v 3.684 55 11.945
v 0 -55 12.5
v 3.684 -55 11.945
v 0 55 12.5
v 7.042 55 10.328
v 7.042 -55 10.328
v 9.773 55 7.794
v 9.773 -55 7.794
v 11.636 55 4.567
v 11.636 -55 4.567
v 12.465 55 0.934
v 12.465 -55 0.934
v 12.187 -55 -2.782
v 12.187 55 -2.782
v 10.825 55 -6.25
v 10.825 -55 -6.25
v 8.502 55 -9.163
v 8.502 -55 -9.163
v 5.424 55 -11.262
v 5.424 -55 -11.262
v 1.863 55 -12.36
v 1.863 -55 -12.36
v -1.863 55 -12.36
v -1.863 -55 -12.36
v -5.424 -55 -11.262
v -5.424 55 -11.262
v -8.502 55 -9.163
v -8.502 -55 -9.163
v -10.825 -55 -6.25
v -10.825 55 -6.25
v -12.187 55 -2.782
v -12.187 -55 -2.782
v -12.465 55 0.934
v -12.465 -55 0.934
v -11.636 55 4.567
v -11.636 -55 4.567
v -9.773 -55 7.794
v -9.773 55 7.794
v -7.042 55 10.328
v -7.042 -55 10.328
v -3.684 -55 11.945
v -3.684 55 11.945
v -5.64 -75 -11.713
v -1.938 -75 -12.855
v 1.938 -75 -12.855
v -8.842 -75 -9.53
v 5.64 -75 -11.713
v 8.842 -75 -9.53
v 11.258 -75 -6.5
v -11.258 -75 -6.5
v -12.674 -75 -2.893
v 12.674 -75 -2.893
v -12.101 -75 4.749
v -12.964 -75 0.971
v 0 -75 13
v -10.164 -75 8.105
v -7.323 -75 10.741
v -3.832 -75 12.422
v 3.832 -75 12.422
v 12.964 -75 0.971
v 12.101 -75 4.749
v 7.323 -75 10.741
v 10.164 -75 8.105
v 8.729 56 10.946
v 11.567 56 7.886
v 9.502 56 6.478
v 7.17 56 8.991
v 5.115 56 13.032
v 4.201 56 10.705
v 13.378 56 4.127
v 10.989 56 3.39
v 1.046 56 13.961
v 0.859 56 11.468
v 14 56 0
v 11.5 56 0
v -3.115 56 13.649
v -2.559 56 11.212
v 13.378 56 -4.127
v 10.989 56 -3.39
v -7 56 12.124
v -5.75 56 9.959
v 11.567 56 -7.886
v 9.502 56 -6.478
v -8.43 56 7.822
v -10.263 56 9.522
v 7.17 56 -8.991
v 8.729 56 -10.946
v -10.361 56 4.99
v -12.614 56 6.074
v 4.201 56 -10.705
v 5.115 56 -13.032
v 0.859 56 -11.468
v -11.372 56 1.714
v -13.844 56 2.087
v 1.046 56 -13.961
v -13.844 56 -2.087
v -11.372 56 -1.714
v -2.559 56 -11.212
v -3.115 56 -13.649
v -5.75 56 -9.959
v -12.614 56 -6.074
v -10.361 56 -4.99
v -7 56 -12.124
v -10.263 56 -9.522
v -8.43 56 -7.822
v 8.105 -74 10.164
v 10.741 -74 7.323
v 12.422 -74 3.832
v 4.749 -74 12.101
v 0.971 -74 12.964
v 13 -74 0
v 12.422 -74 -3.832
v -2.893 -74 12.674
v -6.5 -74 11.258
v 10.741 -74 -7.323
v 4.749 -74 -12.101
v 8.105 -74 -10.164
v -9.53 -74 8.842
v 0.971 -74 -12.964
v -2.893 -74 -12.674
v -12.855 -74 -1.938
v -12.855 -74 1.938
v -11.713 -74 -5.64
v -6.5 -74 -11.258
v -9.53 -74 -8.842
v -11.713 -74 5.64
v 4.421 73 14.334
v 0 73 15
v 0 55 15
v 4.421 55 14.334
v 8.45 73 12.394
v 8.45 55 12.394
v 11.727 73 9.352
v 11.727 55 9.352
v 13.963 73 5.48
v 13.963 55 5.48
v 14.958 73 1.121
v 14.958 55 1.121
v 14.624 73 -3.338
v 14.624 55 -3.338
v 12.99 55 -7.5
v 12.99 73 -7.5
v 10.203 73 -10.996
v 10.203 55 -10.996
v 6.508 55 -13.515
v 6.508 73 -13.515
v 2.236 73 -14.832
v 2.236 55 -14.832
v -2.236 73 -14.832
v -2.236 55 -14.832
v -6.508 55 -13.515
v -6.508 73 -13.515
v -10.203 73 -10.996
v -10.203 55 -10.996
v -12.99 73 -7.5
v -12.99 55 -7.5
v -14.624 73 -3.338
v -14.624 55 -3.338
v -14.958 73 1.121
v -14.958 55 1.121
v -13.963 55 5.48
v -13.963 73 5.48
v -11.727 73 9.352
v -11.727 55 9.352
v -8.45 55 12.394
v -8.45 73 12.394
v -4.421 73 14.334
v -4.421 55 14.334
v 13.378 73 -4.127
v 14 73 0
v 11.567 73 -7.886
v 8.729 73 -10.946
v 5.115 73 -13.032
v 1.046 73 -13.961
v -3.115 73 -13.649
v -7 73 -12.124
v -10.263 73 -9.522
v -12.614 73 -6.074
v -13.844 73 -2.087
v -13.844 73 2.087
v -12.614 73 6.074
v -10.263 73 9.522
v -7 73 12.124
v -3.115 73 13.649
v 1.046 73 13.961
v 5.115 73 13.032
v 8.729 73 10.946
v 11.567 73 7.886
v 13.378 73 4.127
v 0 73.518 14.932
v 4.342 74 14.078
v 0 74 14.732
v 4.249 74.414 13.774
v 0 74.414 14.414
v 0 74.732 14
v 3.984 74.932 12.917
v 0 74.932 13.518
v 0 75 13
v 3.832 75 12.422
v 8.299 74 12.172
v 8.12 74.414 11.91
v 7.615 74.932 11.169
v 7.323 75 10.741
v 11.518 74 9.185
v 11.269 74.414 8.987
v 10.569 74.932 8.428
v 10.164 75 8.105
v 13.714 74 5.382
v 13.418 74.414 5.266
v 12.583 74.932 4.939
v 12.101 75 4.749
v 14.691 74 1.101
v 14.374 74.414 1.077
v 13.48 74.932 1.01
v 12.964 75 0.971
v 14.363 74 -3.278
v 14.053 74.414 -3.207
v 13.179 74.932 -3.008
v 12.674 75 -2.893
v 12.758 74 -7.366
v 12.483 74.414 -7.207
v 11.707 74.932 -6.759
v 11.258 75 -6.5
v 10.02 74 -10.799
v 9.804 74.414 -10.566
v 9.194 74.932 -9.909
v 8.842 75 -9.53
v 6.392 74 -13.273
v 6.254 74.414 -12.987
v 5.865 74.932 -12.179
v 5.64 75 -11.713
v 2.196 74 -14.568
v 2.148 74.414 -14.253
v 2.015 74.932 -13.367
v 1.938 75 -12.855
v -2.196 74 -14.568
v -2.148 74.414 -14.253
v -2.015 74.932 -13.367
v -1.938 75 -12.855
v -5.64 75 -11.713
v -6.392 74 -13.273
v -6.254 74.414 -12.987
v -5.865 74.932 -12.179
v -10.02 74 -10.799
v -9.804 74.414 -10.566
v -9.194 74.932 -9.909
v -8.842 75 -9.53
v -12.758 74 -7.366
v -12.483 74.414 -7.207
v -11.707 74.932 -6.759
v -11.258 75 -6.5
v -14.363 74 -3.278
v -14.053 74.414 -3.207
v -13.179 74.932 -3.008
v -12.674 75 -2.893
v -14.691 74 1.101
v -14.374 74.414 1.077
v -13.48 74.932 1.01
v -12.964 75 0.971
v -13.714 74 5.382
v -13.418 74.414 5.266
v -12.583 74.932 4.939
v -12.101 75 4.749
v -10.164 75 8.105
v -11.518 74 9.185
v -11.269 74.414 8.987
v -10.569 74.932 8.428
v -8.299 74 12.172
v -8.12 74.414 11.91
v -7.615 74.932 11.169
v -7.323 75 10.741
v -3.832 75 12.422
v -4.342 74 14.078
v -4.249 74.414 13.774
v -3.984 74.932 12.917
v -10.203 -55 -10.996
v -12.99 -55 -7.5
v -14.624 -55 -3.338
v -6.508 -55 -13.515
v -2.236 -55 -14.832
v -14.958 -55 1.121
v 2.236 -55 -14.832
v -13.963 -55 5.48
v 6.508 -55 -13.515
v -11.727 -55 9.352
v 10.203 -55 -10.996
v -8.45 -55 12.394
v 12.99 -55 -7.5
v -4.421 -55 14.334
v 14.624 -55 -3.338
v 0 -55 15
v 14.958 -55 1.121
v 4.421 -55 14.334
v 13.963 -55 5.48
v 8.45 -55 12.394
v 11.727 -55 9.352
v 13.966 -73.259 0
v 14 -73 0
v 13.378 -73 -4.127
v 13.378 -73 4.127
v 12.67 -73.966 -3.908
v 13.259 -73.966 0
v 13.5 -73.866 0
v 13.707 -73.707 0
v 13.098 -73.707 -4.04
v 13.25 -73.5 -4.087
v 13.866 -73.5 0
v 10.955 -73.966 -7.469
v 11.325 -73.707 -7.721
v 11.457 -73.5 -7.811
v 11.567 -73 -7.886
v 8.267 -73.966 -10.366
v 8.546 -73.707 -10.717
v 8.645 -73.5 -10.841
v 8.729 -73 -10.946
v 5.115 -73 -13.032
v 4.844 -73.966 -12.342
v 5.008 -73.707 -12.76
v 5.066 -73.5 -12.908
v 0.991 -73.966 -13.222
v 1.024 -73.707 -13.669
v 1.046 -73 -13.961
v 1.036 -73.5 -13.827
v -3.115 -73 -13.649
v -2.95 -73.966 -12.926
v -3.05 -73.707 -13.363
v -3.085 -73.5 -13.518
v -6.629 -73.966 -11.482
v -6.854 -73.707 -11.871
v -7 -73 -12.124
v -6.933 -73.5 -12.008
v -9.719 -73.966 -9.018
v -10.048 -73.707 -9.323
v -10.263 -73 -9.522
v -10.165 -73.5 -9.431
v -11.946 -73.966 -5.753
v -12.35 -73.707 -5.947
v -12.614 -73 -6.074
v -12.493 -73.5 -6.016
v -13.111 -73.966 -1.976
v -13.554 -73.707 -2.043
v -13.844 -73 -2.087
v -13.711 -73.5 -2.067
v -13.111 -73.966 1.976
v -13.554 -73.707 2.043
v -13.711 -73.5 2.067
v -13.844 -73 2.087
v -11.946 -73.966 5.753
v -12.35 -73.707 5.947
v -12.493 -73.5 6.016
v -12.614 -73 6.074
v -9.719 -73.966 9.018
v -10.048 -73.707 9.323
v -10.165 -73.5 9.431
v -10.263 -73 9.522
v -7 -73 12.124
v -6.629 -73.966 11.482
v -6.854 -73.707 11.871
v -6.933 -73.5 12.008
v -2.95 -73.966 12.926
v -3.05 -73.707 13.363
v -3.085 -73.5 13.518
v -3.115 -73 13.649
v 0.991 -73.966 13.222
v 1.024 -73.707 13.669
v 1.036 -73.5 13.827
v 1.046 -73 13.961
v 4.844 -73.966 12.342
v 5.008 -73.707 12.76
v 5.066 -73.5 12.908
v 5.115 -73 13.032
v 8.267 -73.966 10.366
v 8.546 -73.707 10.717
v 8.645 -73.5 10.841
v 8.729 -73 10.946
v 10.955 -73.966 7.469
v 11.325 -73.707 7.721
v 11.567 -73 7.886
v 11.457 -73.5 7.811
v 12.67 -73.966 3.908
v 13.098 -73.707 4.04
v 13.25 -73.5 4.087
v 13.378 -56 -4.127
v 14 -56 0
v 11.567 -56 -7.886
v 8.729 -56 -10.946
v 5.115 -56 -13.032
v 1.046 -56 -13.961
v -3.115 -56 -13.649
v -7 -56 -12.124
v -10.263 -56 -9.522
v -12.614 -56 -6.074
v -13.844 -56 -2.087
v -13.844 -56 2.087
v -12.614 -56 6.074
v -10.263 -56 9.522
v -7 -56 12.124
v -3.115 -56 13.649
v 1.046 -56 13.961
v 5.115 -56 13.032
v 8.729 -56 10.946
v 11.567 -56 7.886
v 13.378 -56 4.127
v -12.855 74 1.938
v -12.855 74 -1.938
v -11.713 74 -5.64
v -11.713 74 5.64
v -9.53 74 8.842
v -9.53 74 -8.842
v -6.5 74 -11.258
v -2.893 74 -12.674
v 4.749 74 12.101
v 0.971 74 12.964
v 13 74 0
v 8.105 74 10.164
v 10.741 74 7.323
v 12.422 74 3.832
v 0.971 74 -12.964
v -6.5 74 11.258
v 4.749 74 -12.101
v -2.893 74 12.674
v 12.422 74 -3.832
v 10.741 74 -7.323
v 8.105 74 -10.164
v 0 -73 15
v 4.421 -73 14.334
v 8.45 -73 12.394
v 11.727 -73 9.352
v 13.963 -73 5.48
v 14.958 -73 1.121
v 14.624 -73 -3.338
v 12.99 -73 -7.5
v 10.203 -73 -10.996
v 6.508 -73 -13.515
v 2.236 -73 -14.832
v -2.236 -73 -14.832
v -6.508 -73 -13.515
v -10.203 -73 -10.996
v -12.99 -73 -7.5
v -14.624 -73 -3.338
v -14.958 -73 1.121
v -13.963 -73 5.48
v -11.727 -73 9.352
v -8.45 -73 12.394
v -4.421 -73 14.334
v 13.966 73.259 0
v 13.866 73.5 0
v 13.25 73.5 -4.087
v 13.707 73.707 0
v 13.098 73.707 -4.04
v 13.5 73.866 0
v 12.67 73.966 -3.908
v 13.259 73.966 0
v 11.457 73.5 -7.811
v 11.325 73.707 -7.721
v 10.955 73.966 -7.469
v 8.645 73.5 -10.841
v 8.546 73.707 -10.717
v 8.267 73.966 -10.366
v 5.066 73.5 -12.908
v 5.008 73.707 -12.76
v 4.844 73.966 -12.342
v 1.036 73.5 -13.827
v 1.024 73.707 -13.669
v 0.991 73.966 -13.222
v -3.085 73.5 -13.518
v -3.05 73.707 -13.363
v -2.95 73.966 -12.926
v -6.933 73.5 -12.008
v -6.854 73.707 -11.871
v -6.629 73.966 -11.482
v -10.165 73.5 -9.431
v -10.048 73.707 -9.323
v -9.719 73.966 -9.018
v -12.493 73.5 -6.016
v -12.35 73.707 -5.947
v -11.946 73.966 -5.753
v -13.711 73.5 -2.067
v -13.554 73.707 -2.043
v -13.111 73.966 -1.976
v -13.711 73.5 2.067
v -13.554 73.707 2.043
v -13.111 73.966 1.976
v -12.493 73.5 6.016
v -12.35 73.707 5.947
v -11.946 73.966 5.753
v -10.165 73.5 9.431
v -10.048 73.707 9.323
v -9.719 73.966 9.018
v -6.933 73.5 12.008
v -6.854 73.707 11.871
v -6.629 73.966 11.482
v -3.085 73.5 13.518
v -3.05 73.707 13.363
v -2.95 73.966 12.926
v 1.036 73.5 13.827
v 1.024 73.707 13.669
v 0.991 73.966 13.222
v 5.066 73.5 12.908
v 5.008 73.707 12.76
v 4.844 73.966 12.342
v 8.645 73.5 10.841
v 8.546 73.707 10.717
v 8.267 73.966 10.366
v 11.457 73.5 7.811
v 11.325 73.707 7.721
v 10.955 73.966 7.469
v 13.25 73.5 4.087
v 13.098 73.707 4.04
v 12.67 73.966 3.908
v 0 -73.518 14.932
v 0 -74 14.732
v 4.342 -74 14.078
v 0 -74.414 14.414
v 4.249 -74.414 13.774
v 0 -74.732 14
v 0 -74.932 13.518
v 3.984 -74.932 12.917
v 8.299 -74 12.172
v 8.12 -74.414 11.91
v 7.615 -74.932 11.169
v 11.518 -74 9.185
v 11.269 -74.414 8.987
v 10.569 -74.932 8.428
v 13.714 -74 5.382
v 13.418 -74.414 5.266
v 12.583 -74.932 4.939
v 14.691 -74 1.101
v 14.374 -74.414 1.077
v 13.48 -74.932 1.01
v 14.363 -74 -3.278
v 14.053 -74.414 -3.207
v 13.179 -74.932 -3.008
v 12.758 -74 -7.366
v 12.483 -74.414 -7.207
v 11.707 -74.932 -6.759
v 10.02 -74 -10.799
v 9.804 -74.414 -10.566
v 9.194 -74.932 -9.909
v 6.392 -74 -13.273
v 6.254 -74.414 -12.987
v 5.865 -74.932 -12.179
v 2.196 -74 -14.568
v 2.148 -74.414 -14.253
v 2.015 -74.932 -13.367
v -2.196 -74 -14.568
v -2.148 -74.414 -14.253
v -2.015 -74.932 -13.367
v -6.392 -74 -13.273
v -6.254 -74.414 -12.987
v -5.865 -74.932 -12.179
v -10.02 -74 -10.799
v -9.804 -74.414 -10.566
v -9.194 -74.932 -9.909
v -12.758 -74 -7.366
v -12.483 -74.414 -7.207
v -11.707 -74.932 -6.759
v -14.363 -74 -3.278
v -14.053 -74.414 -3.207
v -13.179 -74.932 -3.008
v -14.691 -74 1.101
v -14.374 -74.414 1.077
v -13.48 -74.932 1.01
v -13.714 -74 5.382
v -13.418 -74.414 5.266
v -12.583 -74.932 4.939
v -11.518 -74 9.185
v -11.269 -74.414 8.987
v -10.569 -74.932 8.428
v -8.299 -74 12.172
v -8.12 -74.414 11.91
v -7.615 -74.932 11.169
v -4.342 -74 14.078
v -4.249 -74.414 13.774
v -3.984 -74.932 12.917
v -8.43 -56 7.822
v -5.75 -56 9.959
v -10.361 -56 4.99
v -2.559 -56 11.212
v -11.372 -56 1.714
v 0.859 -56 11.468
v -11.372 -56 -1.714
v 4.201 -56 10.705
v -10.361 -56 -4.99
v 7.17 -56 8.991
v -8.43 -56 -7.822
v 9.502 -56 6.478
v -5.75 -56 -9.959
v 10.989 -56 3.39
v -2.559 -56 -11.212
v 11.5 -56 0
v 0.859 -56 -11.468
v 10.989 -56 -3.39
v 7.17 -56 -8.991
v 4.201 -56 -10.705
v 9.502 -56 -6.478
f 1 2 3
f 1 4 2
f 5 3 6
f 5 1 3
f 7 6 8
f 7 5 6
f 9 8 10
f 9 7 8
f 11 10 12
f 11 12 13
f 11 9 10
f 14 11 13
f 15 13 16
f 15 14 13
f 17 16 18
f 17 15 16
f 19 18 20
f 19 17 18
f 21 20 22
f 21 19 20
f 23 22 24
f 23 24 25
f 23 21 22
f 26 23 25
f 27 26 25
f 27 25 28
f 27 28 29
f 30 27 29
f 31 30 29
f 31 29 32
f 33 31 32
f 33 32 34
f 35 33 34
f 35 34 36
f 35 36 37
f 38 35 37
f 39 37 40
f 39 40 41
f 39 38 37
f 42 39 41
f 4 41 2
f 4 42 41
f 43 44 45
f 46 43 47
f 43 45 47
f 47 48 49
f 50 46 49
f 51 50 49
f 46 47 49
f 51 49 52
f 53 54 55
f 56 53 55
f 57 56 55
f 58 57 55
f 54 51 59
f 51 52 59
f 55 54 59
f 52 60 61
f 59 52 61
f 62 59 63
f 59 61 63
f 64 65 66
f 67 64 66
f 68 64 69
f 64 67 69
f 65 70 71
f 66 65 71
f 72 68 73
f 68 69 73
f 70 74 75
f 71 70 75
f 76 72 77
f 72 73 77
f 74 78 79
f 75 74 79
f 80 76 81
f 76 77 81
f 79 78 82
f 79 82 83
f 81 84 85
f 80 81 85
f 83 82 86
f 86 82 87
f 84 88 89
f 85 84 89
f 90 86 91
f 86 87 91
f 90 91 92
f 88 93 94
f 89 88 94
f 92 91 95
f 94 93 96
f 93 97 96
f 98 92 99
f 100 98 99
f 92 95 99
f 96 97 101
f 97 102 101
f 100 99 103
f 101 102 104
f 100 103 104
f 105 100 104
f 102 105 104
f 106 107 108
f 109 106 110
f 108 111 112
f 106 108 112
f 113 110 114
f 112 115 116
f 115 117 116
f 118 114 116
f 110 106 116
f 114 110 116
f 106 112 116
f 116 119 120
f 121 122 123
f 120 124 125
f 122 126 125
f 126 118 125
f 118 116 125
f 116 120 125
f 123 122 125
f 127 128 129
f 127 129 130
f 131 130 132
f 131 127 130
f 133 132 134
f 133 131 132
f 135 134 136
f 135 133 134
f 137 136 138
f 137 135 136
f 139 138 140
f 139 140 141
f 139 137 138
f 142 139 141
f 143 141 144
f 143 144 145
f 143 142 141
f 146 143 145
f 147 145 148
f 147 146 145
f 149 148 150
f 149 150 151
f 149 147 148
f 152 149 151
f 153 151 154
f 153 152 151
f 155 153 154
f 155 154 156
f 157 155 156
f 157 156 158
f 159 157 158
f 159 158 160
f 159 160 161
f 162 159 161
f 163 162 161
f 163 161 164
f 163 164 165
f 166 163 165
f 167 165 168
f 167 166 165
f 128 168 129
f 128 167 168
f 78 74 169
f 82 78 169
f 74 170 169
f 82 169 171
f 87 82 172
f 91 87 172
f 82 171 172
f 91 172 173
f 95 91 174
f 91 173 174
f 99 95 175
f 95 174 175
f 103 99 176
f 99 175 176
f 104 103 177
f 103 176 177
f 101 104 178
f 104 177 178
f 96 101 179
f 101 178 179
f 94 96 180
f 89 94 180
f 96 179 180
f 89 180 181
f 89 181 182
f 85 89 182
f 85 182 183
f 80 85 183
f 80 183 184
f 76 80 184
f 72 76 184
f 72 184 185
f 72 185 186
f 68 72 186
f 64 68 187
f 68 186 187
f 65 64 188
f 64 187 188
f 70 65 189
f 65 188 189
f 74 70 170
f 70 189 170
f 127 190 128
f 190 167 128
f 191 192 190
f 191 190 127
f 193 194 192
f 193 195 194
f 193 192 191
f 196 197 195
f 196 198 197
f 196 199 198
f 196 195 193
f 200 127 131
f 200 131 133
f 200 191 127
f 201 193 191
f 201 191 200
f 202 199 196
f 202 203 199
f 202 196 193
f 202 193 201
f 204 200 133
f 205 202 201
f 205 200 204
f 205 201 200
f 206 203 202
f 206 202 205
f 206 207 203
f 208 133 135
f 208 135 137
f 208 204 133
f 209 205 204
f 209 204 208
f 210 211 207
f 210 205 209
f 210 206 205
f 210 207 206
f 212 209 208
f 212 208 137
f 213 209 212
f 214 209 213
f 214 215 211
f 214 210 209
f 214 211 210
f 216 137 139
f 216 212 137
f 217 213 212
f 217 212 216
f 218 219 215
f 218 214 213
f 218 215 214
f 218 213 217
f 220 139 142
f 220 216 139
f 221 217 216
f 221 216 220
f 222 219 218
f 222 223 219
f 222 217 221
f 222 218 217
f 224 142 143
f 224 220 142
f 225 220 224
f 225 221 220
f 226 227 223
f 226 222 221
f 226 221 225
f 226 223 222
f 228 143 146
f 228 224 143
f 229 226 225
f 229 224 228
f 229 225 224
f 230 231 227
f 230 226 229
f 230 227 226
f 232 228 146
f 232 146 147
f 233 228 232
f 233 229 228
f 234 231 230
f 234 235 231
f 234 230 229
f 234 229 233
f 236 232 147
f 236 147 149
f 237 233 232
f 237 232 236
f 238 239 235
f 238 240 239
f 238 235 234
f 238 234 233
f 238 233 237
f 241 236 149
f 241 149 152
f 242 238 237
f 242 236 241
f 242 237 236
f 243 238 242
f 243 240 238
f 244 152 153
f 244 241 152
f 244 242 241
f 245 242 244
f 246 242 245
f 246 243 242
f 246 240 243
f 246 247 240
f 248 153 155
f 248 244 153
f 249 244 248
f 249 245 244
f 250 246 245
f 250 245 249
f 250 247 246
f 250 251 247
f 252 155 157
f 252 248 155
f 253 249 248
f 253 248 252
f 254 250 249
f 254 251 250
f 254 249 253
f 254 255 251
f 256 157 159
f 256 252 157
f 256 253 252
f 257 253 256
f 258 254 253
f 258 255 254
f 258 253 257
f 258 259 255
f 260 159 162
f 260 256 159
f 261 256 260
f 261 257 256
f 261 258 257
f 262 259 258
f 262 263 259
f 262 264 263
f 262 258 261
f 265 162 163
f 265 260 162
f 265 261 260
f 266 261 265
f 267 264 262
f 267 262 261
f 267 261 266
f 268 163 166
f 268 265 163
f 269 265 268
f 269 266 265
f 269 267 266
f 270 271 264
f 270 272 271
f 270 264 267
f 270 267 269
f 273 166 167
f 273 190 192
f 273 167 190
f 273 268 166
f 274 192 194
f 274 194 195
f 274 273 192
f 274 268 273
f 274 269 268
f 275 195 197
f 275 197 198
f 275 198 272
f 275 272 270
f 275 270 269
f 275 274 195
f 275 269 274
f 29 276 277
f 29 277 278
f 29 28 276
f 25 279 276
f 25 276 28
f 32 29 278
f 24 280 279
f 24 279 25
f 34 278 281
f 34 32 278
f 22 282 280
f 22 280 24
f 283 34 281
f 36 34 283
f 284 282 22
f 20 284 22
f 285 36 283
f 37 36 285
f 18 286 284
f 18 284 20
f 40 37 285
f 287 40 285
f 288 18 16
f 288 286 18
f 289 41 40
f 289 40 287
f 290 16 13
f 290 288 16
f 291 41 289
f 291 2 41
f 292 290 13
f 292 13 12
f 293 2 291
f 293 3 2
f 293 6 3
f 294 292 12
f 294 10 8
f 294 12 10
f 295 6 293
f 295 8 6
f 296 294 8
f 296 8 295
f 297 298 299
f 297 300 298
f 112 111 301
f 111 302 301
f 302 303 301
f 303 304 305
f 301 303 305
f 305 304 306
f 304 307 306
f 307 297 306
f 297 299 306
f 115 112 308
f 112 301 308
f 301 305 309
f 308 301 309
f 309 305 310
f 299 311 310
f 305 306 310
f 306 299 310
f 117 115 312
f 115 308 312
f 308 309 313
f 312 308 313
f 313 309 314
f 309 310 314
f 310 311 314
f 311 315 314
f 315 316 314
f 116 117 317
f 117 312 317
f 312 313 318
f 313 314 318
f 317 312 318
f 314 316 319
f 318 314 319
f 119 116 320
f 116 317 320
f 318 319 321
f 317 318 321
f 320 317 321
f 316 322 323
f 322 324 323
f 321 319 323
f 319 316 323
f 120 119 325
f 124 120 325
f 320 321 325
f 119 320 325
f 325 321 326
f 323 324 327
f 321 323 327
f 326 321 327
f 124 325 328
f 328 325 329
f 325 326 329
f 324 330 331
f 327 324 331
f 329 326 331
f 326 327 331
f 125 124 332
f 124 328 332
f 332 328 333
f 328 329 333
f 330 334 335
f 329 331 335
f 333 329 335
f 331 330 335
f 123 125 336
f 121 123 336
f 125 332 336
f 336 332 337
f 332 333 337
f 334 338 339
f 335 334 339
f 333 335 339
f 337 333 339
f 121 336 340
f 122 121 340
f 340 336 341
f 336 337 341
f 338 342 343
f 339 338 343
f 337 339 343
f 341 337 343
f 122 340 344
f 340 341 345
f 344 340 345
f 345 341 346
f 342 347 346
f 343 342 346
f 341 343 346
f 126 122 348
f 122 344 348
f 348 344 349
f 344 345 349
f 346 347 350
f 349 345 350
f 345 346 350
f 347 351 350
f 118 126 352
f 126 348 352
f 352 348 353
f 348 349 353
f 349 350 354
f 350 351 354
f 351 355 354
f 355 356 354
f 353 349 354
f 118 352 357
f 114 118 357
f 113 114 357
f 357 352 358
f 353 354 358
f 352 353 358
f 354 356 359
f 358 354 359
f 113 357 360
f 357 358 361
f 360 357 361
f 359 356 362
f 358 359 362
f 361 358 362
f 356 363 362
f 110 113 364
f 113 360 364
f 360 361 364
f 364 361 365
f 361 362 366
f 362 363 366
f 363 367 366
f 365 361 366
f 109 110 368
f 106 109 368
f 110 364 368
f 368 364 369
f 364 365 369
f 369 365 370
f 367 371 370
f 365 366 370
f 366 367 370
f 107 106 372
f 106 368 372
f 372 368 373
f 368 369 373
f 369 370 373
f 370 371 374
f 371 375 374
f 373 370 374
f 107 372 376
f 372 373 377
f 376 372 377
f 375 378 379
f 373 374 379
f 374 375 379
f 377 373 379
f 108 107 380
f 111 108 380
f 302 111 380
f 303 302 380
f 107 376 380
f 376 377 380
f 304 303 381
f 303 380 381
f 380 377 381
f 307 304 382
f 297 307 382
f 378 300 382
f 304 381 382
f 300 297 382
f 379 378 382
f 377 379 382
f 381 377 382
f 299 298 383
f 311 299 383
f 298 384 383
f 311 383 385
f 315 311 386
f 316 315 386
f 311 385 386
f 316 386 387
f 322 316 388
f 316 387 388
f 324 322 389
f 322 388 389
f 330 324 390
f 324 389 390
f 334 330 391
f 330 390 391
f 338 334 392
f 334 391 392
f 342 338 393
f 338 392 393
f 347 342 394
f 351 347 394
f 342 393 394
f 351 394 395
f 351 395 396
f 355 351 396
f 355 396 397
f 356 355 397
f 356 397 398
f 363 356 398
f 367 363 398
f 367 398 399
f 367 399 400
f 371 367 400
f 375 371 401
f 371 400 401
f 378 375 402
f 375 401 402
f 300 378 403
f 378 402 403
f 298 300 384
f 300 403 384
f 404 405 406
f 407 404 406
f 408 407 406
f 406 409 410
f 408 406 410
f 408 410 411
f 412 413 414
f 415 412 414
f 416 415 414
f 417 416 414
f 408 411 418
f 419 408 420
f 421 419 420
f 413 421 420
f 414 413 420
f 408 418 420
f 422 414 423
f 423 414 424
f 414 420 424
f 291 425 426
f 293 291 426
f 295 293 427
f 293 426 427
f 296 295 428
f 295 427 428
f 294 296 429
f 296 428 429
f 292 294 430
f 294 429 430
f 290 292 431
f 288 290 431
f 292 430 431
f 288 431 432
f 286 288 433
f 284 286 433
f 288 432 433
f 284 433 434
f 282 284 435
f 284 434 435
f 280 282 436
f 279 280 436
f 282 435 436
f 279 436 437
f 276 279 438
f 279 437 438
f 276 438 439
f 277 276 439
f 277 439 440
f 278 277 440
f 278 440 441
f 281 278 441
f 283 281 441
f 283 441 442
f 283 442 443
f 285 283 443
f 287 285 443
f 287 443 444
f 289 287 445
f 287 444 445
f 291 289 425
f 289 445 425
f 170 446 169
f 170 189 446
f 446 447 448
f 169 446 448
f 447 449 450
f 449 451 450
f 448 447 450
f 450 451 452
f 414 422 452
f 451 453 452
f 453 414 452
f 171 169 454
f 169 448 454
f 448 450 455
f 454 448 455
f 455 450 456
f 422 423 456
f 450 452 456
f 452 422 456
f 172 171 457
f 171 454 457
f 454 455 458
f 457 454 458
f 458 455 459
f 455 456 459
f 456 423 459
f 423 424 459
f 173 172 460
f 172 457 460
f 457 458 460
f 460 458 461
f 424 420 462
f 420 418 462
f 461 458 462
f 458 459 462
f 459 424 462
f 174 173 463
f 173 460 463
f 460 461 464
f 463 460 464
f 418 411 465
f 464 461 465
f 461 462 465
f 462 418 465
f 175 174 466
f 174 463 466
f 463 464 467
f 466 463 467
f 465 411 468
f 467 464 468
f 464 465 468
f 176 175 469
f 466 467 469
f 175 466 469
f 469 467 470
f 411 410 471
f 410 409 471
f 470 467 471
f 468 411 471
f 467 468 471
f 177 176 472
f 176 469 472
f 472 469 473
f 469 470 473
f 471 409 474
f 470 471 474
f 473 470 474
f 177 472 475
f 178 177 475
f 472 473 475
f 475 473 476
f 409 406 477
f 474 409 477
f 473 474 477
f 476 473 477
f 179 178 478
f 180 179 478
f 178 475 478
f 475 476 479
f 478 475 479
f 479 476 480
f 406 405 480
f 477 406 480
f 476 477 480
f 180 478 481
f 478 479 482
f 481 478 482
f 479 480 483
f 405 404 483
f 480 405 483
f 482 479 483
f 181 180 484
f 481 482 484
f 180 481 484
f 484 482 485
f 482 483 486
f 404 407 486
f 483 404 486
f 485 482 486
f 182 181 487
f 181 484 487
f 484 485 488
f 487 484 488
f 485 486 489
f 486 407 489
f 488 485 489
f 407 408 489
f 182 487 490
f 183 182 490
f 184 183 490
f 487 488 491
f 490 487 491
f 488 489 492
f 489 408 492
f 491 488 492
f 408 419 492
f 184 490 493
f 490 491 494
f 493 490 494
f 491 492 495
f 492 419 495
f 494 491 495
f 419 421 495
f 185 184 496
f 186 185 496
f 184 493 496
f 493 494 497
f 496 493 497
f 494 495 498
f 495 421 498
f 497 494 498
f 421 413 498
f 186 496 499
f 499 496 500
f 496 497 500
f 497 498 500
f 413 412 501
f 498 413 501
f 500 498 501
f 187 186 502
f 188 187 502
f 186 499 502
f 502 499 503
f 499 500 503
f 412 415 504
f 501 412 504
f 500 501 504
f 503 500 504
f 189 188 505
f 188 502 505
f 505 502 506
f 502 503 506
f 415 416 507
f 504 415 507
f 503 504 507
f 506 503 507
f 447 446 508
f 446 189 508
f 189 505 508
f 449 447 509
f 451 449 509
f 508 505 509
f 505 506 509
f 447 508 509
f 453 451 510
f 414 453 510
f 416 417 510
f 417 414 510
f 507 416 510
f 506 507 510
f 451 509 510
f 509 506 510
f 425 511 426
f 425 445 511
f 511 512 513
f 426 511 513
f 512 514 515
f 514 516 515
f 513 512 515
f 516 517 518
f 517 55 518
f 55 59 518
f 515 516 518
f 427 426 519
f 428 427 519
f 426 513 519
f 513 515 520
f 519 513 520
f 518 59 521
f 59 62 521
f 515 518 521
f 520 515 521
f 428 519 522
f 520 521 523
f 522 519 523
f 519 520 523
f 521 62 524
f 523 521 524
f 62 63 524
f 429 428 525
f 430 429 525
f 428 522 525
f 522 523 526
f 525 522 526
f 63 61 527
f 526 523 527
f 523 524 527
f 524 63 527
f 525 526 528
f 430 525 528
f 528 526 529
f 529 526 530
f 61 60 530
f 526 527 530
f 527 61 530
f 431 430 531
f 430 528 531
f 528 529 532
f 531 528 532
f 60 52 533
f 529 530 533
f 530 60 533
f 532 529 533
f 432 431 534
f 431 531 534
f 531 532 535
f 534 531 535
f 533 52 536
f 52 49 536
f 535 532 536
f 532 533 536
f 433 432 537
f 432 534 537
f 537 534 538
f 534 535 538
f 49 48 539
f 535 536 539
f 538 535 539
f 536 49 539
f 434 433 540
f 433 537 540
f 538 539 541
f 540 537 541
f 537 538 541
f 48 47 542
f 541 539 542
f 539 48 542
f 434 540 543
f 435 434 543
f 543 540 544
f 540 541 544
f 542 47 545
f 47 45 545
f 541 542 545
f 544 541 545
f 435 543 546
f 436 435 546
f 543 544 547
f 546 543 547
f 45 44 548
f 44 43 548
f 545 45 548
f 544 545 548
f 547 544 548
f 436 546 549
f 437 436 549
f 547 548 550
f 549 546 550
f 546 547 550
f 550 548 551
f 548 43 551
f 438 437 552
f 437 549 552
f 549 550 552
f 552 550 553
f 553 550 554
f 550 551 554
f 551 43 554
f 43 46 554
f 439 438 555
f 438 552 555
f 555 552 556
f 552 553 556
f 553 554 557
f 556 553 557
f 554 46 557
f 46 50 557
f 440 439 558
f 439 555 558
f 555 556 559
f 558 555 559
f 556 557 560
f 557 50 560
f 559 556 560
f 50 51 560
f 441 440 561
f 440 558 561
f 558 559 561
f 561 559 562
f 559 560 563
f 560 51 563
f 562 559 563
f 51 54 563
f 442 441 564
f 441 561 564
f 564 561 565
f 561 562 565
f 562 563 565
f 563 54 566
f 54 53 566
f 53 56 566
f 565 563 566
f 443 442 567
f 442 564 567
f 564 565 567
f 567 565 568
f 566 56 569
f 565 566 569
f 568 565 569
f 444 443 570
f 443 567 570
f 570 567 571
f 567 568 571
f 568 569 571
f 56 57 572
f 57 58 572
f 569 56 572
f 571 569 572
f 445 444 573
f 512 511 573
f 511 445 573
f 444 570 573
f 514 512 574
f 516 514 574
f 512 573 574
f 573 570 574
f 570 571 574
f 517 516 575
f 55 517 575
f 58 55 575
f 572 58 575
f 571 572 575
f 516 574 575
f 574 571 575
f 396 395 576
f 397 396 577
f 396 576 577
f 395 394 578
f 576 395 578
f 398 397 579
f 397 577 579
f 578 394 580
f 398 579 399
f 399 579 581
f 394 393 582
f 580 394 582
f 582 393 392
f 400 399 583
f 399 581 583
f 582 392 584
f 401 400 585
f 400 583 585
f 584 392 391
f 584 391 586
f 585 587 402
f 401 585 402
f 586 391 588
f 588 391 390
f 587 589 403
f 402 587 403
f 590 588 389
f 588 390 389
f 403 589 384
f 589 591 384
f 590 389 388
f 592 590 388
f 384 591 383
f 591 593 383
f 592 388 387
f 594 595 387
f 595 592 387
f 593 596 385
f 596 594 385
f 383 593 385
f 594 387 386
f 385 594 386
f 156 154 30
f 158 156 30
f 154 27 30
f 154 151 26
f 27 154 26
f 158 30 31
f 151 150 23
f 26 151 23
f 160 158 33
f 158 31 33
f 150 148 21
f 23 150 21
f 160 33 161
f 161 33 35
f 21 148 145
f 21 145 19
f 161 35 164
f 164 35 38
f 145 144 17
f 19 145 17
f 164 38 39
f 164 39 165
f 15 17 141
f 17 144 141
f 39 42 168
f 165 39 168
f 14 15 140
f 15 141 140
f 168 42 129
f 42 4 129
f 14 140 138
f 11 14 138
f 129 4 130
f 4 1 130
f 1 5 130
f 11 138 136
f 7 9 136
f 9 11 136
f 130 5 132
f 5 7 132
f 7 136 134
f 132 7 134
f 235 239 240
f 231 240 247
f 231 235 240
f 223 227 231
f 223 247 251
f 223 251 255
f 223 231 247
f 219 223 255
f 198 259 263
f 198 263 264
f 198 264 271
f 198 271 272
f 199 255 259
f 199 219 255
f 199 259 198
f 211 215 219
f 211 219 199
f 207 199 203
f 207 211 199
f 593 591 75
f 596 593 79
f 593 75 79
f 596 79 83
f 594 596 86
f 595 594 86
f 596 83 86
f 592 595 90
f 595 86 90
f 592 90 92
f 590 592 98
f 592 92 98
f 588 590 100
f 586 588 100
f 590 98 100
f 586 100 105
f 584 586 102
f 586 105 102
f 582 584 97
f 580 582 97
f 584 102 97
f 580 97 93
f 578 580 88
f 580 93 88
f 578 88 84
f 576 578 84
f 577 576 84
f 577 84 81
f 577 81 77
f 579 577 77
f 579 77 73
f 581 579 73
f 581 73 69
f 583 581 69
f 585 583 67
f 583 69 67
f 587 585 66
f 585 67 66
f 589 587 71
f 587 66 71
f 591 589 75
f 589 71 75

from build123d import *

# Parameters (mm, degrees)
SKETCH1_R           = 12.5
BOSS_EXTRUDE1_DEPTH = 75
SKETCH2_R           = 15
BOSS_EXTRUDE2_DEPTH = 20
FILLET1_R           = 2


# Read off the part's stored shape, not the designer's step: Shell2
with BuildPart() as part:
    # Sketch1 → Boss-Extrude1 (new, symmetric)
    with BuildSketch(Plane(origin=(0, 0, 0), x_dir=(1, 0, 0), z_dir=(0, 1, 0))):
        with Locations(Location((0, 0, 0), (0, 0, 270))):
            Circle(SKETCH1_R)
    extrude(amount=BOSS_EXTRUDE1_DEPTH, both=True)

    # Sketch2 → Boss-Extrude2 (add)
    with BuildSketch(Plane(origin=(0, 75, 0), x_dir=(1, 0, 0), z_dir=(0, 1, 0))):
        with Locations(Location((0, 0, 0), (0, 0, 270))):
            Circle(SKETCH2_R)
    boss_extrude2 = extrude(amount=-BOSS_EXTRUDE2_DEPTH)

    # Mirror1: Boss-Extrude2 across plane
    add(boss_extrude2.mirror(Plane.ZX))

    # Fillet1
    fillet1_edges = [part.edges().sort_by_distance(p)[0] for p in [
        (0, -75, -15),
        (0, 75, -15),
    ]]
    fillet(fillet1_edges, radius=FILLET1_R)

    # Shell2 outline → Shell2 (revolve, cut)
    with BuildSketch(Plane.XY):
        with BuildLine():
            Line((13, 74), (0, 74))
            Line((0, 74), (0, -74))
            Line((0, -74), (13, -74))
            ThreePointArc((13, -74), (13.707106781, -73.707106781), (14, -73))
            Line((14, -73), (14, -56))
            Line((14, -56), (11.5, -56))
            Line((11.5, -56), (11.5, 56))
            Line((11.5, 56), (14, 56))
            Line((14, 56), (14, 73))
            ThreePointArc((14, 73), (13.707106781, 73.707106781), (13, 74))
        make_face()
    revolve(axis=Axis((0, 0, 0), (0, 1, 0)), mode=Mode.SUBTRACT)


solid = part.part
